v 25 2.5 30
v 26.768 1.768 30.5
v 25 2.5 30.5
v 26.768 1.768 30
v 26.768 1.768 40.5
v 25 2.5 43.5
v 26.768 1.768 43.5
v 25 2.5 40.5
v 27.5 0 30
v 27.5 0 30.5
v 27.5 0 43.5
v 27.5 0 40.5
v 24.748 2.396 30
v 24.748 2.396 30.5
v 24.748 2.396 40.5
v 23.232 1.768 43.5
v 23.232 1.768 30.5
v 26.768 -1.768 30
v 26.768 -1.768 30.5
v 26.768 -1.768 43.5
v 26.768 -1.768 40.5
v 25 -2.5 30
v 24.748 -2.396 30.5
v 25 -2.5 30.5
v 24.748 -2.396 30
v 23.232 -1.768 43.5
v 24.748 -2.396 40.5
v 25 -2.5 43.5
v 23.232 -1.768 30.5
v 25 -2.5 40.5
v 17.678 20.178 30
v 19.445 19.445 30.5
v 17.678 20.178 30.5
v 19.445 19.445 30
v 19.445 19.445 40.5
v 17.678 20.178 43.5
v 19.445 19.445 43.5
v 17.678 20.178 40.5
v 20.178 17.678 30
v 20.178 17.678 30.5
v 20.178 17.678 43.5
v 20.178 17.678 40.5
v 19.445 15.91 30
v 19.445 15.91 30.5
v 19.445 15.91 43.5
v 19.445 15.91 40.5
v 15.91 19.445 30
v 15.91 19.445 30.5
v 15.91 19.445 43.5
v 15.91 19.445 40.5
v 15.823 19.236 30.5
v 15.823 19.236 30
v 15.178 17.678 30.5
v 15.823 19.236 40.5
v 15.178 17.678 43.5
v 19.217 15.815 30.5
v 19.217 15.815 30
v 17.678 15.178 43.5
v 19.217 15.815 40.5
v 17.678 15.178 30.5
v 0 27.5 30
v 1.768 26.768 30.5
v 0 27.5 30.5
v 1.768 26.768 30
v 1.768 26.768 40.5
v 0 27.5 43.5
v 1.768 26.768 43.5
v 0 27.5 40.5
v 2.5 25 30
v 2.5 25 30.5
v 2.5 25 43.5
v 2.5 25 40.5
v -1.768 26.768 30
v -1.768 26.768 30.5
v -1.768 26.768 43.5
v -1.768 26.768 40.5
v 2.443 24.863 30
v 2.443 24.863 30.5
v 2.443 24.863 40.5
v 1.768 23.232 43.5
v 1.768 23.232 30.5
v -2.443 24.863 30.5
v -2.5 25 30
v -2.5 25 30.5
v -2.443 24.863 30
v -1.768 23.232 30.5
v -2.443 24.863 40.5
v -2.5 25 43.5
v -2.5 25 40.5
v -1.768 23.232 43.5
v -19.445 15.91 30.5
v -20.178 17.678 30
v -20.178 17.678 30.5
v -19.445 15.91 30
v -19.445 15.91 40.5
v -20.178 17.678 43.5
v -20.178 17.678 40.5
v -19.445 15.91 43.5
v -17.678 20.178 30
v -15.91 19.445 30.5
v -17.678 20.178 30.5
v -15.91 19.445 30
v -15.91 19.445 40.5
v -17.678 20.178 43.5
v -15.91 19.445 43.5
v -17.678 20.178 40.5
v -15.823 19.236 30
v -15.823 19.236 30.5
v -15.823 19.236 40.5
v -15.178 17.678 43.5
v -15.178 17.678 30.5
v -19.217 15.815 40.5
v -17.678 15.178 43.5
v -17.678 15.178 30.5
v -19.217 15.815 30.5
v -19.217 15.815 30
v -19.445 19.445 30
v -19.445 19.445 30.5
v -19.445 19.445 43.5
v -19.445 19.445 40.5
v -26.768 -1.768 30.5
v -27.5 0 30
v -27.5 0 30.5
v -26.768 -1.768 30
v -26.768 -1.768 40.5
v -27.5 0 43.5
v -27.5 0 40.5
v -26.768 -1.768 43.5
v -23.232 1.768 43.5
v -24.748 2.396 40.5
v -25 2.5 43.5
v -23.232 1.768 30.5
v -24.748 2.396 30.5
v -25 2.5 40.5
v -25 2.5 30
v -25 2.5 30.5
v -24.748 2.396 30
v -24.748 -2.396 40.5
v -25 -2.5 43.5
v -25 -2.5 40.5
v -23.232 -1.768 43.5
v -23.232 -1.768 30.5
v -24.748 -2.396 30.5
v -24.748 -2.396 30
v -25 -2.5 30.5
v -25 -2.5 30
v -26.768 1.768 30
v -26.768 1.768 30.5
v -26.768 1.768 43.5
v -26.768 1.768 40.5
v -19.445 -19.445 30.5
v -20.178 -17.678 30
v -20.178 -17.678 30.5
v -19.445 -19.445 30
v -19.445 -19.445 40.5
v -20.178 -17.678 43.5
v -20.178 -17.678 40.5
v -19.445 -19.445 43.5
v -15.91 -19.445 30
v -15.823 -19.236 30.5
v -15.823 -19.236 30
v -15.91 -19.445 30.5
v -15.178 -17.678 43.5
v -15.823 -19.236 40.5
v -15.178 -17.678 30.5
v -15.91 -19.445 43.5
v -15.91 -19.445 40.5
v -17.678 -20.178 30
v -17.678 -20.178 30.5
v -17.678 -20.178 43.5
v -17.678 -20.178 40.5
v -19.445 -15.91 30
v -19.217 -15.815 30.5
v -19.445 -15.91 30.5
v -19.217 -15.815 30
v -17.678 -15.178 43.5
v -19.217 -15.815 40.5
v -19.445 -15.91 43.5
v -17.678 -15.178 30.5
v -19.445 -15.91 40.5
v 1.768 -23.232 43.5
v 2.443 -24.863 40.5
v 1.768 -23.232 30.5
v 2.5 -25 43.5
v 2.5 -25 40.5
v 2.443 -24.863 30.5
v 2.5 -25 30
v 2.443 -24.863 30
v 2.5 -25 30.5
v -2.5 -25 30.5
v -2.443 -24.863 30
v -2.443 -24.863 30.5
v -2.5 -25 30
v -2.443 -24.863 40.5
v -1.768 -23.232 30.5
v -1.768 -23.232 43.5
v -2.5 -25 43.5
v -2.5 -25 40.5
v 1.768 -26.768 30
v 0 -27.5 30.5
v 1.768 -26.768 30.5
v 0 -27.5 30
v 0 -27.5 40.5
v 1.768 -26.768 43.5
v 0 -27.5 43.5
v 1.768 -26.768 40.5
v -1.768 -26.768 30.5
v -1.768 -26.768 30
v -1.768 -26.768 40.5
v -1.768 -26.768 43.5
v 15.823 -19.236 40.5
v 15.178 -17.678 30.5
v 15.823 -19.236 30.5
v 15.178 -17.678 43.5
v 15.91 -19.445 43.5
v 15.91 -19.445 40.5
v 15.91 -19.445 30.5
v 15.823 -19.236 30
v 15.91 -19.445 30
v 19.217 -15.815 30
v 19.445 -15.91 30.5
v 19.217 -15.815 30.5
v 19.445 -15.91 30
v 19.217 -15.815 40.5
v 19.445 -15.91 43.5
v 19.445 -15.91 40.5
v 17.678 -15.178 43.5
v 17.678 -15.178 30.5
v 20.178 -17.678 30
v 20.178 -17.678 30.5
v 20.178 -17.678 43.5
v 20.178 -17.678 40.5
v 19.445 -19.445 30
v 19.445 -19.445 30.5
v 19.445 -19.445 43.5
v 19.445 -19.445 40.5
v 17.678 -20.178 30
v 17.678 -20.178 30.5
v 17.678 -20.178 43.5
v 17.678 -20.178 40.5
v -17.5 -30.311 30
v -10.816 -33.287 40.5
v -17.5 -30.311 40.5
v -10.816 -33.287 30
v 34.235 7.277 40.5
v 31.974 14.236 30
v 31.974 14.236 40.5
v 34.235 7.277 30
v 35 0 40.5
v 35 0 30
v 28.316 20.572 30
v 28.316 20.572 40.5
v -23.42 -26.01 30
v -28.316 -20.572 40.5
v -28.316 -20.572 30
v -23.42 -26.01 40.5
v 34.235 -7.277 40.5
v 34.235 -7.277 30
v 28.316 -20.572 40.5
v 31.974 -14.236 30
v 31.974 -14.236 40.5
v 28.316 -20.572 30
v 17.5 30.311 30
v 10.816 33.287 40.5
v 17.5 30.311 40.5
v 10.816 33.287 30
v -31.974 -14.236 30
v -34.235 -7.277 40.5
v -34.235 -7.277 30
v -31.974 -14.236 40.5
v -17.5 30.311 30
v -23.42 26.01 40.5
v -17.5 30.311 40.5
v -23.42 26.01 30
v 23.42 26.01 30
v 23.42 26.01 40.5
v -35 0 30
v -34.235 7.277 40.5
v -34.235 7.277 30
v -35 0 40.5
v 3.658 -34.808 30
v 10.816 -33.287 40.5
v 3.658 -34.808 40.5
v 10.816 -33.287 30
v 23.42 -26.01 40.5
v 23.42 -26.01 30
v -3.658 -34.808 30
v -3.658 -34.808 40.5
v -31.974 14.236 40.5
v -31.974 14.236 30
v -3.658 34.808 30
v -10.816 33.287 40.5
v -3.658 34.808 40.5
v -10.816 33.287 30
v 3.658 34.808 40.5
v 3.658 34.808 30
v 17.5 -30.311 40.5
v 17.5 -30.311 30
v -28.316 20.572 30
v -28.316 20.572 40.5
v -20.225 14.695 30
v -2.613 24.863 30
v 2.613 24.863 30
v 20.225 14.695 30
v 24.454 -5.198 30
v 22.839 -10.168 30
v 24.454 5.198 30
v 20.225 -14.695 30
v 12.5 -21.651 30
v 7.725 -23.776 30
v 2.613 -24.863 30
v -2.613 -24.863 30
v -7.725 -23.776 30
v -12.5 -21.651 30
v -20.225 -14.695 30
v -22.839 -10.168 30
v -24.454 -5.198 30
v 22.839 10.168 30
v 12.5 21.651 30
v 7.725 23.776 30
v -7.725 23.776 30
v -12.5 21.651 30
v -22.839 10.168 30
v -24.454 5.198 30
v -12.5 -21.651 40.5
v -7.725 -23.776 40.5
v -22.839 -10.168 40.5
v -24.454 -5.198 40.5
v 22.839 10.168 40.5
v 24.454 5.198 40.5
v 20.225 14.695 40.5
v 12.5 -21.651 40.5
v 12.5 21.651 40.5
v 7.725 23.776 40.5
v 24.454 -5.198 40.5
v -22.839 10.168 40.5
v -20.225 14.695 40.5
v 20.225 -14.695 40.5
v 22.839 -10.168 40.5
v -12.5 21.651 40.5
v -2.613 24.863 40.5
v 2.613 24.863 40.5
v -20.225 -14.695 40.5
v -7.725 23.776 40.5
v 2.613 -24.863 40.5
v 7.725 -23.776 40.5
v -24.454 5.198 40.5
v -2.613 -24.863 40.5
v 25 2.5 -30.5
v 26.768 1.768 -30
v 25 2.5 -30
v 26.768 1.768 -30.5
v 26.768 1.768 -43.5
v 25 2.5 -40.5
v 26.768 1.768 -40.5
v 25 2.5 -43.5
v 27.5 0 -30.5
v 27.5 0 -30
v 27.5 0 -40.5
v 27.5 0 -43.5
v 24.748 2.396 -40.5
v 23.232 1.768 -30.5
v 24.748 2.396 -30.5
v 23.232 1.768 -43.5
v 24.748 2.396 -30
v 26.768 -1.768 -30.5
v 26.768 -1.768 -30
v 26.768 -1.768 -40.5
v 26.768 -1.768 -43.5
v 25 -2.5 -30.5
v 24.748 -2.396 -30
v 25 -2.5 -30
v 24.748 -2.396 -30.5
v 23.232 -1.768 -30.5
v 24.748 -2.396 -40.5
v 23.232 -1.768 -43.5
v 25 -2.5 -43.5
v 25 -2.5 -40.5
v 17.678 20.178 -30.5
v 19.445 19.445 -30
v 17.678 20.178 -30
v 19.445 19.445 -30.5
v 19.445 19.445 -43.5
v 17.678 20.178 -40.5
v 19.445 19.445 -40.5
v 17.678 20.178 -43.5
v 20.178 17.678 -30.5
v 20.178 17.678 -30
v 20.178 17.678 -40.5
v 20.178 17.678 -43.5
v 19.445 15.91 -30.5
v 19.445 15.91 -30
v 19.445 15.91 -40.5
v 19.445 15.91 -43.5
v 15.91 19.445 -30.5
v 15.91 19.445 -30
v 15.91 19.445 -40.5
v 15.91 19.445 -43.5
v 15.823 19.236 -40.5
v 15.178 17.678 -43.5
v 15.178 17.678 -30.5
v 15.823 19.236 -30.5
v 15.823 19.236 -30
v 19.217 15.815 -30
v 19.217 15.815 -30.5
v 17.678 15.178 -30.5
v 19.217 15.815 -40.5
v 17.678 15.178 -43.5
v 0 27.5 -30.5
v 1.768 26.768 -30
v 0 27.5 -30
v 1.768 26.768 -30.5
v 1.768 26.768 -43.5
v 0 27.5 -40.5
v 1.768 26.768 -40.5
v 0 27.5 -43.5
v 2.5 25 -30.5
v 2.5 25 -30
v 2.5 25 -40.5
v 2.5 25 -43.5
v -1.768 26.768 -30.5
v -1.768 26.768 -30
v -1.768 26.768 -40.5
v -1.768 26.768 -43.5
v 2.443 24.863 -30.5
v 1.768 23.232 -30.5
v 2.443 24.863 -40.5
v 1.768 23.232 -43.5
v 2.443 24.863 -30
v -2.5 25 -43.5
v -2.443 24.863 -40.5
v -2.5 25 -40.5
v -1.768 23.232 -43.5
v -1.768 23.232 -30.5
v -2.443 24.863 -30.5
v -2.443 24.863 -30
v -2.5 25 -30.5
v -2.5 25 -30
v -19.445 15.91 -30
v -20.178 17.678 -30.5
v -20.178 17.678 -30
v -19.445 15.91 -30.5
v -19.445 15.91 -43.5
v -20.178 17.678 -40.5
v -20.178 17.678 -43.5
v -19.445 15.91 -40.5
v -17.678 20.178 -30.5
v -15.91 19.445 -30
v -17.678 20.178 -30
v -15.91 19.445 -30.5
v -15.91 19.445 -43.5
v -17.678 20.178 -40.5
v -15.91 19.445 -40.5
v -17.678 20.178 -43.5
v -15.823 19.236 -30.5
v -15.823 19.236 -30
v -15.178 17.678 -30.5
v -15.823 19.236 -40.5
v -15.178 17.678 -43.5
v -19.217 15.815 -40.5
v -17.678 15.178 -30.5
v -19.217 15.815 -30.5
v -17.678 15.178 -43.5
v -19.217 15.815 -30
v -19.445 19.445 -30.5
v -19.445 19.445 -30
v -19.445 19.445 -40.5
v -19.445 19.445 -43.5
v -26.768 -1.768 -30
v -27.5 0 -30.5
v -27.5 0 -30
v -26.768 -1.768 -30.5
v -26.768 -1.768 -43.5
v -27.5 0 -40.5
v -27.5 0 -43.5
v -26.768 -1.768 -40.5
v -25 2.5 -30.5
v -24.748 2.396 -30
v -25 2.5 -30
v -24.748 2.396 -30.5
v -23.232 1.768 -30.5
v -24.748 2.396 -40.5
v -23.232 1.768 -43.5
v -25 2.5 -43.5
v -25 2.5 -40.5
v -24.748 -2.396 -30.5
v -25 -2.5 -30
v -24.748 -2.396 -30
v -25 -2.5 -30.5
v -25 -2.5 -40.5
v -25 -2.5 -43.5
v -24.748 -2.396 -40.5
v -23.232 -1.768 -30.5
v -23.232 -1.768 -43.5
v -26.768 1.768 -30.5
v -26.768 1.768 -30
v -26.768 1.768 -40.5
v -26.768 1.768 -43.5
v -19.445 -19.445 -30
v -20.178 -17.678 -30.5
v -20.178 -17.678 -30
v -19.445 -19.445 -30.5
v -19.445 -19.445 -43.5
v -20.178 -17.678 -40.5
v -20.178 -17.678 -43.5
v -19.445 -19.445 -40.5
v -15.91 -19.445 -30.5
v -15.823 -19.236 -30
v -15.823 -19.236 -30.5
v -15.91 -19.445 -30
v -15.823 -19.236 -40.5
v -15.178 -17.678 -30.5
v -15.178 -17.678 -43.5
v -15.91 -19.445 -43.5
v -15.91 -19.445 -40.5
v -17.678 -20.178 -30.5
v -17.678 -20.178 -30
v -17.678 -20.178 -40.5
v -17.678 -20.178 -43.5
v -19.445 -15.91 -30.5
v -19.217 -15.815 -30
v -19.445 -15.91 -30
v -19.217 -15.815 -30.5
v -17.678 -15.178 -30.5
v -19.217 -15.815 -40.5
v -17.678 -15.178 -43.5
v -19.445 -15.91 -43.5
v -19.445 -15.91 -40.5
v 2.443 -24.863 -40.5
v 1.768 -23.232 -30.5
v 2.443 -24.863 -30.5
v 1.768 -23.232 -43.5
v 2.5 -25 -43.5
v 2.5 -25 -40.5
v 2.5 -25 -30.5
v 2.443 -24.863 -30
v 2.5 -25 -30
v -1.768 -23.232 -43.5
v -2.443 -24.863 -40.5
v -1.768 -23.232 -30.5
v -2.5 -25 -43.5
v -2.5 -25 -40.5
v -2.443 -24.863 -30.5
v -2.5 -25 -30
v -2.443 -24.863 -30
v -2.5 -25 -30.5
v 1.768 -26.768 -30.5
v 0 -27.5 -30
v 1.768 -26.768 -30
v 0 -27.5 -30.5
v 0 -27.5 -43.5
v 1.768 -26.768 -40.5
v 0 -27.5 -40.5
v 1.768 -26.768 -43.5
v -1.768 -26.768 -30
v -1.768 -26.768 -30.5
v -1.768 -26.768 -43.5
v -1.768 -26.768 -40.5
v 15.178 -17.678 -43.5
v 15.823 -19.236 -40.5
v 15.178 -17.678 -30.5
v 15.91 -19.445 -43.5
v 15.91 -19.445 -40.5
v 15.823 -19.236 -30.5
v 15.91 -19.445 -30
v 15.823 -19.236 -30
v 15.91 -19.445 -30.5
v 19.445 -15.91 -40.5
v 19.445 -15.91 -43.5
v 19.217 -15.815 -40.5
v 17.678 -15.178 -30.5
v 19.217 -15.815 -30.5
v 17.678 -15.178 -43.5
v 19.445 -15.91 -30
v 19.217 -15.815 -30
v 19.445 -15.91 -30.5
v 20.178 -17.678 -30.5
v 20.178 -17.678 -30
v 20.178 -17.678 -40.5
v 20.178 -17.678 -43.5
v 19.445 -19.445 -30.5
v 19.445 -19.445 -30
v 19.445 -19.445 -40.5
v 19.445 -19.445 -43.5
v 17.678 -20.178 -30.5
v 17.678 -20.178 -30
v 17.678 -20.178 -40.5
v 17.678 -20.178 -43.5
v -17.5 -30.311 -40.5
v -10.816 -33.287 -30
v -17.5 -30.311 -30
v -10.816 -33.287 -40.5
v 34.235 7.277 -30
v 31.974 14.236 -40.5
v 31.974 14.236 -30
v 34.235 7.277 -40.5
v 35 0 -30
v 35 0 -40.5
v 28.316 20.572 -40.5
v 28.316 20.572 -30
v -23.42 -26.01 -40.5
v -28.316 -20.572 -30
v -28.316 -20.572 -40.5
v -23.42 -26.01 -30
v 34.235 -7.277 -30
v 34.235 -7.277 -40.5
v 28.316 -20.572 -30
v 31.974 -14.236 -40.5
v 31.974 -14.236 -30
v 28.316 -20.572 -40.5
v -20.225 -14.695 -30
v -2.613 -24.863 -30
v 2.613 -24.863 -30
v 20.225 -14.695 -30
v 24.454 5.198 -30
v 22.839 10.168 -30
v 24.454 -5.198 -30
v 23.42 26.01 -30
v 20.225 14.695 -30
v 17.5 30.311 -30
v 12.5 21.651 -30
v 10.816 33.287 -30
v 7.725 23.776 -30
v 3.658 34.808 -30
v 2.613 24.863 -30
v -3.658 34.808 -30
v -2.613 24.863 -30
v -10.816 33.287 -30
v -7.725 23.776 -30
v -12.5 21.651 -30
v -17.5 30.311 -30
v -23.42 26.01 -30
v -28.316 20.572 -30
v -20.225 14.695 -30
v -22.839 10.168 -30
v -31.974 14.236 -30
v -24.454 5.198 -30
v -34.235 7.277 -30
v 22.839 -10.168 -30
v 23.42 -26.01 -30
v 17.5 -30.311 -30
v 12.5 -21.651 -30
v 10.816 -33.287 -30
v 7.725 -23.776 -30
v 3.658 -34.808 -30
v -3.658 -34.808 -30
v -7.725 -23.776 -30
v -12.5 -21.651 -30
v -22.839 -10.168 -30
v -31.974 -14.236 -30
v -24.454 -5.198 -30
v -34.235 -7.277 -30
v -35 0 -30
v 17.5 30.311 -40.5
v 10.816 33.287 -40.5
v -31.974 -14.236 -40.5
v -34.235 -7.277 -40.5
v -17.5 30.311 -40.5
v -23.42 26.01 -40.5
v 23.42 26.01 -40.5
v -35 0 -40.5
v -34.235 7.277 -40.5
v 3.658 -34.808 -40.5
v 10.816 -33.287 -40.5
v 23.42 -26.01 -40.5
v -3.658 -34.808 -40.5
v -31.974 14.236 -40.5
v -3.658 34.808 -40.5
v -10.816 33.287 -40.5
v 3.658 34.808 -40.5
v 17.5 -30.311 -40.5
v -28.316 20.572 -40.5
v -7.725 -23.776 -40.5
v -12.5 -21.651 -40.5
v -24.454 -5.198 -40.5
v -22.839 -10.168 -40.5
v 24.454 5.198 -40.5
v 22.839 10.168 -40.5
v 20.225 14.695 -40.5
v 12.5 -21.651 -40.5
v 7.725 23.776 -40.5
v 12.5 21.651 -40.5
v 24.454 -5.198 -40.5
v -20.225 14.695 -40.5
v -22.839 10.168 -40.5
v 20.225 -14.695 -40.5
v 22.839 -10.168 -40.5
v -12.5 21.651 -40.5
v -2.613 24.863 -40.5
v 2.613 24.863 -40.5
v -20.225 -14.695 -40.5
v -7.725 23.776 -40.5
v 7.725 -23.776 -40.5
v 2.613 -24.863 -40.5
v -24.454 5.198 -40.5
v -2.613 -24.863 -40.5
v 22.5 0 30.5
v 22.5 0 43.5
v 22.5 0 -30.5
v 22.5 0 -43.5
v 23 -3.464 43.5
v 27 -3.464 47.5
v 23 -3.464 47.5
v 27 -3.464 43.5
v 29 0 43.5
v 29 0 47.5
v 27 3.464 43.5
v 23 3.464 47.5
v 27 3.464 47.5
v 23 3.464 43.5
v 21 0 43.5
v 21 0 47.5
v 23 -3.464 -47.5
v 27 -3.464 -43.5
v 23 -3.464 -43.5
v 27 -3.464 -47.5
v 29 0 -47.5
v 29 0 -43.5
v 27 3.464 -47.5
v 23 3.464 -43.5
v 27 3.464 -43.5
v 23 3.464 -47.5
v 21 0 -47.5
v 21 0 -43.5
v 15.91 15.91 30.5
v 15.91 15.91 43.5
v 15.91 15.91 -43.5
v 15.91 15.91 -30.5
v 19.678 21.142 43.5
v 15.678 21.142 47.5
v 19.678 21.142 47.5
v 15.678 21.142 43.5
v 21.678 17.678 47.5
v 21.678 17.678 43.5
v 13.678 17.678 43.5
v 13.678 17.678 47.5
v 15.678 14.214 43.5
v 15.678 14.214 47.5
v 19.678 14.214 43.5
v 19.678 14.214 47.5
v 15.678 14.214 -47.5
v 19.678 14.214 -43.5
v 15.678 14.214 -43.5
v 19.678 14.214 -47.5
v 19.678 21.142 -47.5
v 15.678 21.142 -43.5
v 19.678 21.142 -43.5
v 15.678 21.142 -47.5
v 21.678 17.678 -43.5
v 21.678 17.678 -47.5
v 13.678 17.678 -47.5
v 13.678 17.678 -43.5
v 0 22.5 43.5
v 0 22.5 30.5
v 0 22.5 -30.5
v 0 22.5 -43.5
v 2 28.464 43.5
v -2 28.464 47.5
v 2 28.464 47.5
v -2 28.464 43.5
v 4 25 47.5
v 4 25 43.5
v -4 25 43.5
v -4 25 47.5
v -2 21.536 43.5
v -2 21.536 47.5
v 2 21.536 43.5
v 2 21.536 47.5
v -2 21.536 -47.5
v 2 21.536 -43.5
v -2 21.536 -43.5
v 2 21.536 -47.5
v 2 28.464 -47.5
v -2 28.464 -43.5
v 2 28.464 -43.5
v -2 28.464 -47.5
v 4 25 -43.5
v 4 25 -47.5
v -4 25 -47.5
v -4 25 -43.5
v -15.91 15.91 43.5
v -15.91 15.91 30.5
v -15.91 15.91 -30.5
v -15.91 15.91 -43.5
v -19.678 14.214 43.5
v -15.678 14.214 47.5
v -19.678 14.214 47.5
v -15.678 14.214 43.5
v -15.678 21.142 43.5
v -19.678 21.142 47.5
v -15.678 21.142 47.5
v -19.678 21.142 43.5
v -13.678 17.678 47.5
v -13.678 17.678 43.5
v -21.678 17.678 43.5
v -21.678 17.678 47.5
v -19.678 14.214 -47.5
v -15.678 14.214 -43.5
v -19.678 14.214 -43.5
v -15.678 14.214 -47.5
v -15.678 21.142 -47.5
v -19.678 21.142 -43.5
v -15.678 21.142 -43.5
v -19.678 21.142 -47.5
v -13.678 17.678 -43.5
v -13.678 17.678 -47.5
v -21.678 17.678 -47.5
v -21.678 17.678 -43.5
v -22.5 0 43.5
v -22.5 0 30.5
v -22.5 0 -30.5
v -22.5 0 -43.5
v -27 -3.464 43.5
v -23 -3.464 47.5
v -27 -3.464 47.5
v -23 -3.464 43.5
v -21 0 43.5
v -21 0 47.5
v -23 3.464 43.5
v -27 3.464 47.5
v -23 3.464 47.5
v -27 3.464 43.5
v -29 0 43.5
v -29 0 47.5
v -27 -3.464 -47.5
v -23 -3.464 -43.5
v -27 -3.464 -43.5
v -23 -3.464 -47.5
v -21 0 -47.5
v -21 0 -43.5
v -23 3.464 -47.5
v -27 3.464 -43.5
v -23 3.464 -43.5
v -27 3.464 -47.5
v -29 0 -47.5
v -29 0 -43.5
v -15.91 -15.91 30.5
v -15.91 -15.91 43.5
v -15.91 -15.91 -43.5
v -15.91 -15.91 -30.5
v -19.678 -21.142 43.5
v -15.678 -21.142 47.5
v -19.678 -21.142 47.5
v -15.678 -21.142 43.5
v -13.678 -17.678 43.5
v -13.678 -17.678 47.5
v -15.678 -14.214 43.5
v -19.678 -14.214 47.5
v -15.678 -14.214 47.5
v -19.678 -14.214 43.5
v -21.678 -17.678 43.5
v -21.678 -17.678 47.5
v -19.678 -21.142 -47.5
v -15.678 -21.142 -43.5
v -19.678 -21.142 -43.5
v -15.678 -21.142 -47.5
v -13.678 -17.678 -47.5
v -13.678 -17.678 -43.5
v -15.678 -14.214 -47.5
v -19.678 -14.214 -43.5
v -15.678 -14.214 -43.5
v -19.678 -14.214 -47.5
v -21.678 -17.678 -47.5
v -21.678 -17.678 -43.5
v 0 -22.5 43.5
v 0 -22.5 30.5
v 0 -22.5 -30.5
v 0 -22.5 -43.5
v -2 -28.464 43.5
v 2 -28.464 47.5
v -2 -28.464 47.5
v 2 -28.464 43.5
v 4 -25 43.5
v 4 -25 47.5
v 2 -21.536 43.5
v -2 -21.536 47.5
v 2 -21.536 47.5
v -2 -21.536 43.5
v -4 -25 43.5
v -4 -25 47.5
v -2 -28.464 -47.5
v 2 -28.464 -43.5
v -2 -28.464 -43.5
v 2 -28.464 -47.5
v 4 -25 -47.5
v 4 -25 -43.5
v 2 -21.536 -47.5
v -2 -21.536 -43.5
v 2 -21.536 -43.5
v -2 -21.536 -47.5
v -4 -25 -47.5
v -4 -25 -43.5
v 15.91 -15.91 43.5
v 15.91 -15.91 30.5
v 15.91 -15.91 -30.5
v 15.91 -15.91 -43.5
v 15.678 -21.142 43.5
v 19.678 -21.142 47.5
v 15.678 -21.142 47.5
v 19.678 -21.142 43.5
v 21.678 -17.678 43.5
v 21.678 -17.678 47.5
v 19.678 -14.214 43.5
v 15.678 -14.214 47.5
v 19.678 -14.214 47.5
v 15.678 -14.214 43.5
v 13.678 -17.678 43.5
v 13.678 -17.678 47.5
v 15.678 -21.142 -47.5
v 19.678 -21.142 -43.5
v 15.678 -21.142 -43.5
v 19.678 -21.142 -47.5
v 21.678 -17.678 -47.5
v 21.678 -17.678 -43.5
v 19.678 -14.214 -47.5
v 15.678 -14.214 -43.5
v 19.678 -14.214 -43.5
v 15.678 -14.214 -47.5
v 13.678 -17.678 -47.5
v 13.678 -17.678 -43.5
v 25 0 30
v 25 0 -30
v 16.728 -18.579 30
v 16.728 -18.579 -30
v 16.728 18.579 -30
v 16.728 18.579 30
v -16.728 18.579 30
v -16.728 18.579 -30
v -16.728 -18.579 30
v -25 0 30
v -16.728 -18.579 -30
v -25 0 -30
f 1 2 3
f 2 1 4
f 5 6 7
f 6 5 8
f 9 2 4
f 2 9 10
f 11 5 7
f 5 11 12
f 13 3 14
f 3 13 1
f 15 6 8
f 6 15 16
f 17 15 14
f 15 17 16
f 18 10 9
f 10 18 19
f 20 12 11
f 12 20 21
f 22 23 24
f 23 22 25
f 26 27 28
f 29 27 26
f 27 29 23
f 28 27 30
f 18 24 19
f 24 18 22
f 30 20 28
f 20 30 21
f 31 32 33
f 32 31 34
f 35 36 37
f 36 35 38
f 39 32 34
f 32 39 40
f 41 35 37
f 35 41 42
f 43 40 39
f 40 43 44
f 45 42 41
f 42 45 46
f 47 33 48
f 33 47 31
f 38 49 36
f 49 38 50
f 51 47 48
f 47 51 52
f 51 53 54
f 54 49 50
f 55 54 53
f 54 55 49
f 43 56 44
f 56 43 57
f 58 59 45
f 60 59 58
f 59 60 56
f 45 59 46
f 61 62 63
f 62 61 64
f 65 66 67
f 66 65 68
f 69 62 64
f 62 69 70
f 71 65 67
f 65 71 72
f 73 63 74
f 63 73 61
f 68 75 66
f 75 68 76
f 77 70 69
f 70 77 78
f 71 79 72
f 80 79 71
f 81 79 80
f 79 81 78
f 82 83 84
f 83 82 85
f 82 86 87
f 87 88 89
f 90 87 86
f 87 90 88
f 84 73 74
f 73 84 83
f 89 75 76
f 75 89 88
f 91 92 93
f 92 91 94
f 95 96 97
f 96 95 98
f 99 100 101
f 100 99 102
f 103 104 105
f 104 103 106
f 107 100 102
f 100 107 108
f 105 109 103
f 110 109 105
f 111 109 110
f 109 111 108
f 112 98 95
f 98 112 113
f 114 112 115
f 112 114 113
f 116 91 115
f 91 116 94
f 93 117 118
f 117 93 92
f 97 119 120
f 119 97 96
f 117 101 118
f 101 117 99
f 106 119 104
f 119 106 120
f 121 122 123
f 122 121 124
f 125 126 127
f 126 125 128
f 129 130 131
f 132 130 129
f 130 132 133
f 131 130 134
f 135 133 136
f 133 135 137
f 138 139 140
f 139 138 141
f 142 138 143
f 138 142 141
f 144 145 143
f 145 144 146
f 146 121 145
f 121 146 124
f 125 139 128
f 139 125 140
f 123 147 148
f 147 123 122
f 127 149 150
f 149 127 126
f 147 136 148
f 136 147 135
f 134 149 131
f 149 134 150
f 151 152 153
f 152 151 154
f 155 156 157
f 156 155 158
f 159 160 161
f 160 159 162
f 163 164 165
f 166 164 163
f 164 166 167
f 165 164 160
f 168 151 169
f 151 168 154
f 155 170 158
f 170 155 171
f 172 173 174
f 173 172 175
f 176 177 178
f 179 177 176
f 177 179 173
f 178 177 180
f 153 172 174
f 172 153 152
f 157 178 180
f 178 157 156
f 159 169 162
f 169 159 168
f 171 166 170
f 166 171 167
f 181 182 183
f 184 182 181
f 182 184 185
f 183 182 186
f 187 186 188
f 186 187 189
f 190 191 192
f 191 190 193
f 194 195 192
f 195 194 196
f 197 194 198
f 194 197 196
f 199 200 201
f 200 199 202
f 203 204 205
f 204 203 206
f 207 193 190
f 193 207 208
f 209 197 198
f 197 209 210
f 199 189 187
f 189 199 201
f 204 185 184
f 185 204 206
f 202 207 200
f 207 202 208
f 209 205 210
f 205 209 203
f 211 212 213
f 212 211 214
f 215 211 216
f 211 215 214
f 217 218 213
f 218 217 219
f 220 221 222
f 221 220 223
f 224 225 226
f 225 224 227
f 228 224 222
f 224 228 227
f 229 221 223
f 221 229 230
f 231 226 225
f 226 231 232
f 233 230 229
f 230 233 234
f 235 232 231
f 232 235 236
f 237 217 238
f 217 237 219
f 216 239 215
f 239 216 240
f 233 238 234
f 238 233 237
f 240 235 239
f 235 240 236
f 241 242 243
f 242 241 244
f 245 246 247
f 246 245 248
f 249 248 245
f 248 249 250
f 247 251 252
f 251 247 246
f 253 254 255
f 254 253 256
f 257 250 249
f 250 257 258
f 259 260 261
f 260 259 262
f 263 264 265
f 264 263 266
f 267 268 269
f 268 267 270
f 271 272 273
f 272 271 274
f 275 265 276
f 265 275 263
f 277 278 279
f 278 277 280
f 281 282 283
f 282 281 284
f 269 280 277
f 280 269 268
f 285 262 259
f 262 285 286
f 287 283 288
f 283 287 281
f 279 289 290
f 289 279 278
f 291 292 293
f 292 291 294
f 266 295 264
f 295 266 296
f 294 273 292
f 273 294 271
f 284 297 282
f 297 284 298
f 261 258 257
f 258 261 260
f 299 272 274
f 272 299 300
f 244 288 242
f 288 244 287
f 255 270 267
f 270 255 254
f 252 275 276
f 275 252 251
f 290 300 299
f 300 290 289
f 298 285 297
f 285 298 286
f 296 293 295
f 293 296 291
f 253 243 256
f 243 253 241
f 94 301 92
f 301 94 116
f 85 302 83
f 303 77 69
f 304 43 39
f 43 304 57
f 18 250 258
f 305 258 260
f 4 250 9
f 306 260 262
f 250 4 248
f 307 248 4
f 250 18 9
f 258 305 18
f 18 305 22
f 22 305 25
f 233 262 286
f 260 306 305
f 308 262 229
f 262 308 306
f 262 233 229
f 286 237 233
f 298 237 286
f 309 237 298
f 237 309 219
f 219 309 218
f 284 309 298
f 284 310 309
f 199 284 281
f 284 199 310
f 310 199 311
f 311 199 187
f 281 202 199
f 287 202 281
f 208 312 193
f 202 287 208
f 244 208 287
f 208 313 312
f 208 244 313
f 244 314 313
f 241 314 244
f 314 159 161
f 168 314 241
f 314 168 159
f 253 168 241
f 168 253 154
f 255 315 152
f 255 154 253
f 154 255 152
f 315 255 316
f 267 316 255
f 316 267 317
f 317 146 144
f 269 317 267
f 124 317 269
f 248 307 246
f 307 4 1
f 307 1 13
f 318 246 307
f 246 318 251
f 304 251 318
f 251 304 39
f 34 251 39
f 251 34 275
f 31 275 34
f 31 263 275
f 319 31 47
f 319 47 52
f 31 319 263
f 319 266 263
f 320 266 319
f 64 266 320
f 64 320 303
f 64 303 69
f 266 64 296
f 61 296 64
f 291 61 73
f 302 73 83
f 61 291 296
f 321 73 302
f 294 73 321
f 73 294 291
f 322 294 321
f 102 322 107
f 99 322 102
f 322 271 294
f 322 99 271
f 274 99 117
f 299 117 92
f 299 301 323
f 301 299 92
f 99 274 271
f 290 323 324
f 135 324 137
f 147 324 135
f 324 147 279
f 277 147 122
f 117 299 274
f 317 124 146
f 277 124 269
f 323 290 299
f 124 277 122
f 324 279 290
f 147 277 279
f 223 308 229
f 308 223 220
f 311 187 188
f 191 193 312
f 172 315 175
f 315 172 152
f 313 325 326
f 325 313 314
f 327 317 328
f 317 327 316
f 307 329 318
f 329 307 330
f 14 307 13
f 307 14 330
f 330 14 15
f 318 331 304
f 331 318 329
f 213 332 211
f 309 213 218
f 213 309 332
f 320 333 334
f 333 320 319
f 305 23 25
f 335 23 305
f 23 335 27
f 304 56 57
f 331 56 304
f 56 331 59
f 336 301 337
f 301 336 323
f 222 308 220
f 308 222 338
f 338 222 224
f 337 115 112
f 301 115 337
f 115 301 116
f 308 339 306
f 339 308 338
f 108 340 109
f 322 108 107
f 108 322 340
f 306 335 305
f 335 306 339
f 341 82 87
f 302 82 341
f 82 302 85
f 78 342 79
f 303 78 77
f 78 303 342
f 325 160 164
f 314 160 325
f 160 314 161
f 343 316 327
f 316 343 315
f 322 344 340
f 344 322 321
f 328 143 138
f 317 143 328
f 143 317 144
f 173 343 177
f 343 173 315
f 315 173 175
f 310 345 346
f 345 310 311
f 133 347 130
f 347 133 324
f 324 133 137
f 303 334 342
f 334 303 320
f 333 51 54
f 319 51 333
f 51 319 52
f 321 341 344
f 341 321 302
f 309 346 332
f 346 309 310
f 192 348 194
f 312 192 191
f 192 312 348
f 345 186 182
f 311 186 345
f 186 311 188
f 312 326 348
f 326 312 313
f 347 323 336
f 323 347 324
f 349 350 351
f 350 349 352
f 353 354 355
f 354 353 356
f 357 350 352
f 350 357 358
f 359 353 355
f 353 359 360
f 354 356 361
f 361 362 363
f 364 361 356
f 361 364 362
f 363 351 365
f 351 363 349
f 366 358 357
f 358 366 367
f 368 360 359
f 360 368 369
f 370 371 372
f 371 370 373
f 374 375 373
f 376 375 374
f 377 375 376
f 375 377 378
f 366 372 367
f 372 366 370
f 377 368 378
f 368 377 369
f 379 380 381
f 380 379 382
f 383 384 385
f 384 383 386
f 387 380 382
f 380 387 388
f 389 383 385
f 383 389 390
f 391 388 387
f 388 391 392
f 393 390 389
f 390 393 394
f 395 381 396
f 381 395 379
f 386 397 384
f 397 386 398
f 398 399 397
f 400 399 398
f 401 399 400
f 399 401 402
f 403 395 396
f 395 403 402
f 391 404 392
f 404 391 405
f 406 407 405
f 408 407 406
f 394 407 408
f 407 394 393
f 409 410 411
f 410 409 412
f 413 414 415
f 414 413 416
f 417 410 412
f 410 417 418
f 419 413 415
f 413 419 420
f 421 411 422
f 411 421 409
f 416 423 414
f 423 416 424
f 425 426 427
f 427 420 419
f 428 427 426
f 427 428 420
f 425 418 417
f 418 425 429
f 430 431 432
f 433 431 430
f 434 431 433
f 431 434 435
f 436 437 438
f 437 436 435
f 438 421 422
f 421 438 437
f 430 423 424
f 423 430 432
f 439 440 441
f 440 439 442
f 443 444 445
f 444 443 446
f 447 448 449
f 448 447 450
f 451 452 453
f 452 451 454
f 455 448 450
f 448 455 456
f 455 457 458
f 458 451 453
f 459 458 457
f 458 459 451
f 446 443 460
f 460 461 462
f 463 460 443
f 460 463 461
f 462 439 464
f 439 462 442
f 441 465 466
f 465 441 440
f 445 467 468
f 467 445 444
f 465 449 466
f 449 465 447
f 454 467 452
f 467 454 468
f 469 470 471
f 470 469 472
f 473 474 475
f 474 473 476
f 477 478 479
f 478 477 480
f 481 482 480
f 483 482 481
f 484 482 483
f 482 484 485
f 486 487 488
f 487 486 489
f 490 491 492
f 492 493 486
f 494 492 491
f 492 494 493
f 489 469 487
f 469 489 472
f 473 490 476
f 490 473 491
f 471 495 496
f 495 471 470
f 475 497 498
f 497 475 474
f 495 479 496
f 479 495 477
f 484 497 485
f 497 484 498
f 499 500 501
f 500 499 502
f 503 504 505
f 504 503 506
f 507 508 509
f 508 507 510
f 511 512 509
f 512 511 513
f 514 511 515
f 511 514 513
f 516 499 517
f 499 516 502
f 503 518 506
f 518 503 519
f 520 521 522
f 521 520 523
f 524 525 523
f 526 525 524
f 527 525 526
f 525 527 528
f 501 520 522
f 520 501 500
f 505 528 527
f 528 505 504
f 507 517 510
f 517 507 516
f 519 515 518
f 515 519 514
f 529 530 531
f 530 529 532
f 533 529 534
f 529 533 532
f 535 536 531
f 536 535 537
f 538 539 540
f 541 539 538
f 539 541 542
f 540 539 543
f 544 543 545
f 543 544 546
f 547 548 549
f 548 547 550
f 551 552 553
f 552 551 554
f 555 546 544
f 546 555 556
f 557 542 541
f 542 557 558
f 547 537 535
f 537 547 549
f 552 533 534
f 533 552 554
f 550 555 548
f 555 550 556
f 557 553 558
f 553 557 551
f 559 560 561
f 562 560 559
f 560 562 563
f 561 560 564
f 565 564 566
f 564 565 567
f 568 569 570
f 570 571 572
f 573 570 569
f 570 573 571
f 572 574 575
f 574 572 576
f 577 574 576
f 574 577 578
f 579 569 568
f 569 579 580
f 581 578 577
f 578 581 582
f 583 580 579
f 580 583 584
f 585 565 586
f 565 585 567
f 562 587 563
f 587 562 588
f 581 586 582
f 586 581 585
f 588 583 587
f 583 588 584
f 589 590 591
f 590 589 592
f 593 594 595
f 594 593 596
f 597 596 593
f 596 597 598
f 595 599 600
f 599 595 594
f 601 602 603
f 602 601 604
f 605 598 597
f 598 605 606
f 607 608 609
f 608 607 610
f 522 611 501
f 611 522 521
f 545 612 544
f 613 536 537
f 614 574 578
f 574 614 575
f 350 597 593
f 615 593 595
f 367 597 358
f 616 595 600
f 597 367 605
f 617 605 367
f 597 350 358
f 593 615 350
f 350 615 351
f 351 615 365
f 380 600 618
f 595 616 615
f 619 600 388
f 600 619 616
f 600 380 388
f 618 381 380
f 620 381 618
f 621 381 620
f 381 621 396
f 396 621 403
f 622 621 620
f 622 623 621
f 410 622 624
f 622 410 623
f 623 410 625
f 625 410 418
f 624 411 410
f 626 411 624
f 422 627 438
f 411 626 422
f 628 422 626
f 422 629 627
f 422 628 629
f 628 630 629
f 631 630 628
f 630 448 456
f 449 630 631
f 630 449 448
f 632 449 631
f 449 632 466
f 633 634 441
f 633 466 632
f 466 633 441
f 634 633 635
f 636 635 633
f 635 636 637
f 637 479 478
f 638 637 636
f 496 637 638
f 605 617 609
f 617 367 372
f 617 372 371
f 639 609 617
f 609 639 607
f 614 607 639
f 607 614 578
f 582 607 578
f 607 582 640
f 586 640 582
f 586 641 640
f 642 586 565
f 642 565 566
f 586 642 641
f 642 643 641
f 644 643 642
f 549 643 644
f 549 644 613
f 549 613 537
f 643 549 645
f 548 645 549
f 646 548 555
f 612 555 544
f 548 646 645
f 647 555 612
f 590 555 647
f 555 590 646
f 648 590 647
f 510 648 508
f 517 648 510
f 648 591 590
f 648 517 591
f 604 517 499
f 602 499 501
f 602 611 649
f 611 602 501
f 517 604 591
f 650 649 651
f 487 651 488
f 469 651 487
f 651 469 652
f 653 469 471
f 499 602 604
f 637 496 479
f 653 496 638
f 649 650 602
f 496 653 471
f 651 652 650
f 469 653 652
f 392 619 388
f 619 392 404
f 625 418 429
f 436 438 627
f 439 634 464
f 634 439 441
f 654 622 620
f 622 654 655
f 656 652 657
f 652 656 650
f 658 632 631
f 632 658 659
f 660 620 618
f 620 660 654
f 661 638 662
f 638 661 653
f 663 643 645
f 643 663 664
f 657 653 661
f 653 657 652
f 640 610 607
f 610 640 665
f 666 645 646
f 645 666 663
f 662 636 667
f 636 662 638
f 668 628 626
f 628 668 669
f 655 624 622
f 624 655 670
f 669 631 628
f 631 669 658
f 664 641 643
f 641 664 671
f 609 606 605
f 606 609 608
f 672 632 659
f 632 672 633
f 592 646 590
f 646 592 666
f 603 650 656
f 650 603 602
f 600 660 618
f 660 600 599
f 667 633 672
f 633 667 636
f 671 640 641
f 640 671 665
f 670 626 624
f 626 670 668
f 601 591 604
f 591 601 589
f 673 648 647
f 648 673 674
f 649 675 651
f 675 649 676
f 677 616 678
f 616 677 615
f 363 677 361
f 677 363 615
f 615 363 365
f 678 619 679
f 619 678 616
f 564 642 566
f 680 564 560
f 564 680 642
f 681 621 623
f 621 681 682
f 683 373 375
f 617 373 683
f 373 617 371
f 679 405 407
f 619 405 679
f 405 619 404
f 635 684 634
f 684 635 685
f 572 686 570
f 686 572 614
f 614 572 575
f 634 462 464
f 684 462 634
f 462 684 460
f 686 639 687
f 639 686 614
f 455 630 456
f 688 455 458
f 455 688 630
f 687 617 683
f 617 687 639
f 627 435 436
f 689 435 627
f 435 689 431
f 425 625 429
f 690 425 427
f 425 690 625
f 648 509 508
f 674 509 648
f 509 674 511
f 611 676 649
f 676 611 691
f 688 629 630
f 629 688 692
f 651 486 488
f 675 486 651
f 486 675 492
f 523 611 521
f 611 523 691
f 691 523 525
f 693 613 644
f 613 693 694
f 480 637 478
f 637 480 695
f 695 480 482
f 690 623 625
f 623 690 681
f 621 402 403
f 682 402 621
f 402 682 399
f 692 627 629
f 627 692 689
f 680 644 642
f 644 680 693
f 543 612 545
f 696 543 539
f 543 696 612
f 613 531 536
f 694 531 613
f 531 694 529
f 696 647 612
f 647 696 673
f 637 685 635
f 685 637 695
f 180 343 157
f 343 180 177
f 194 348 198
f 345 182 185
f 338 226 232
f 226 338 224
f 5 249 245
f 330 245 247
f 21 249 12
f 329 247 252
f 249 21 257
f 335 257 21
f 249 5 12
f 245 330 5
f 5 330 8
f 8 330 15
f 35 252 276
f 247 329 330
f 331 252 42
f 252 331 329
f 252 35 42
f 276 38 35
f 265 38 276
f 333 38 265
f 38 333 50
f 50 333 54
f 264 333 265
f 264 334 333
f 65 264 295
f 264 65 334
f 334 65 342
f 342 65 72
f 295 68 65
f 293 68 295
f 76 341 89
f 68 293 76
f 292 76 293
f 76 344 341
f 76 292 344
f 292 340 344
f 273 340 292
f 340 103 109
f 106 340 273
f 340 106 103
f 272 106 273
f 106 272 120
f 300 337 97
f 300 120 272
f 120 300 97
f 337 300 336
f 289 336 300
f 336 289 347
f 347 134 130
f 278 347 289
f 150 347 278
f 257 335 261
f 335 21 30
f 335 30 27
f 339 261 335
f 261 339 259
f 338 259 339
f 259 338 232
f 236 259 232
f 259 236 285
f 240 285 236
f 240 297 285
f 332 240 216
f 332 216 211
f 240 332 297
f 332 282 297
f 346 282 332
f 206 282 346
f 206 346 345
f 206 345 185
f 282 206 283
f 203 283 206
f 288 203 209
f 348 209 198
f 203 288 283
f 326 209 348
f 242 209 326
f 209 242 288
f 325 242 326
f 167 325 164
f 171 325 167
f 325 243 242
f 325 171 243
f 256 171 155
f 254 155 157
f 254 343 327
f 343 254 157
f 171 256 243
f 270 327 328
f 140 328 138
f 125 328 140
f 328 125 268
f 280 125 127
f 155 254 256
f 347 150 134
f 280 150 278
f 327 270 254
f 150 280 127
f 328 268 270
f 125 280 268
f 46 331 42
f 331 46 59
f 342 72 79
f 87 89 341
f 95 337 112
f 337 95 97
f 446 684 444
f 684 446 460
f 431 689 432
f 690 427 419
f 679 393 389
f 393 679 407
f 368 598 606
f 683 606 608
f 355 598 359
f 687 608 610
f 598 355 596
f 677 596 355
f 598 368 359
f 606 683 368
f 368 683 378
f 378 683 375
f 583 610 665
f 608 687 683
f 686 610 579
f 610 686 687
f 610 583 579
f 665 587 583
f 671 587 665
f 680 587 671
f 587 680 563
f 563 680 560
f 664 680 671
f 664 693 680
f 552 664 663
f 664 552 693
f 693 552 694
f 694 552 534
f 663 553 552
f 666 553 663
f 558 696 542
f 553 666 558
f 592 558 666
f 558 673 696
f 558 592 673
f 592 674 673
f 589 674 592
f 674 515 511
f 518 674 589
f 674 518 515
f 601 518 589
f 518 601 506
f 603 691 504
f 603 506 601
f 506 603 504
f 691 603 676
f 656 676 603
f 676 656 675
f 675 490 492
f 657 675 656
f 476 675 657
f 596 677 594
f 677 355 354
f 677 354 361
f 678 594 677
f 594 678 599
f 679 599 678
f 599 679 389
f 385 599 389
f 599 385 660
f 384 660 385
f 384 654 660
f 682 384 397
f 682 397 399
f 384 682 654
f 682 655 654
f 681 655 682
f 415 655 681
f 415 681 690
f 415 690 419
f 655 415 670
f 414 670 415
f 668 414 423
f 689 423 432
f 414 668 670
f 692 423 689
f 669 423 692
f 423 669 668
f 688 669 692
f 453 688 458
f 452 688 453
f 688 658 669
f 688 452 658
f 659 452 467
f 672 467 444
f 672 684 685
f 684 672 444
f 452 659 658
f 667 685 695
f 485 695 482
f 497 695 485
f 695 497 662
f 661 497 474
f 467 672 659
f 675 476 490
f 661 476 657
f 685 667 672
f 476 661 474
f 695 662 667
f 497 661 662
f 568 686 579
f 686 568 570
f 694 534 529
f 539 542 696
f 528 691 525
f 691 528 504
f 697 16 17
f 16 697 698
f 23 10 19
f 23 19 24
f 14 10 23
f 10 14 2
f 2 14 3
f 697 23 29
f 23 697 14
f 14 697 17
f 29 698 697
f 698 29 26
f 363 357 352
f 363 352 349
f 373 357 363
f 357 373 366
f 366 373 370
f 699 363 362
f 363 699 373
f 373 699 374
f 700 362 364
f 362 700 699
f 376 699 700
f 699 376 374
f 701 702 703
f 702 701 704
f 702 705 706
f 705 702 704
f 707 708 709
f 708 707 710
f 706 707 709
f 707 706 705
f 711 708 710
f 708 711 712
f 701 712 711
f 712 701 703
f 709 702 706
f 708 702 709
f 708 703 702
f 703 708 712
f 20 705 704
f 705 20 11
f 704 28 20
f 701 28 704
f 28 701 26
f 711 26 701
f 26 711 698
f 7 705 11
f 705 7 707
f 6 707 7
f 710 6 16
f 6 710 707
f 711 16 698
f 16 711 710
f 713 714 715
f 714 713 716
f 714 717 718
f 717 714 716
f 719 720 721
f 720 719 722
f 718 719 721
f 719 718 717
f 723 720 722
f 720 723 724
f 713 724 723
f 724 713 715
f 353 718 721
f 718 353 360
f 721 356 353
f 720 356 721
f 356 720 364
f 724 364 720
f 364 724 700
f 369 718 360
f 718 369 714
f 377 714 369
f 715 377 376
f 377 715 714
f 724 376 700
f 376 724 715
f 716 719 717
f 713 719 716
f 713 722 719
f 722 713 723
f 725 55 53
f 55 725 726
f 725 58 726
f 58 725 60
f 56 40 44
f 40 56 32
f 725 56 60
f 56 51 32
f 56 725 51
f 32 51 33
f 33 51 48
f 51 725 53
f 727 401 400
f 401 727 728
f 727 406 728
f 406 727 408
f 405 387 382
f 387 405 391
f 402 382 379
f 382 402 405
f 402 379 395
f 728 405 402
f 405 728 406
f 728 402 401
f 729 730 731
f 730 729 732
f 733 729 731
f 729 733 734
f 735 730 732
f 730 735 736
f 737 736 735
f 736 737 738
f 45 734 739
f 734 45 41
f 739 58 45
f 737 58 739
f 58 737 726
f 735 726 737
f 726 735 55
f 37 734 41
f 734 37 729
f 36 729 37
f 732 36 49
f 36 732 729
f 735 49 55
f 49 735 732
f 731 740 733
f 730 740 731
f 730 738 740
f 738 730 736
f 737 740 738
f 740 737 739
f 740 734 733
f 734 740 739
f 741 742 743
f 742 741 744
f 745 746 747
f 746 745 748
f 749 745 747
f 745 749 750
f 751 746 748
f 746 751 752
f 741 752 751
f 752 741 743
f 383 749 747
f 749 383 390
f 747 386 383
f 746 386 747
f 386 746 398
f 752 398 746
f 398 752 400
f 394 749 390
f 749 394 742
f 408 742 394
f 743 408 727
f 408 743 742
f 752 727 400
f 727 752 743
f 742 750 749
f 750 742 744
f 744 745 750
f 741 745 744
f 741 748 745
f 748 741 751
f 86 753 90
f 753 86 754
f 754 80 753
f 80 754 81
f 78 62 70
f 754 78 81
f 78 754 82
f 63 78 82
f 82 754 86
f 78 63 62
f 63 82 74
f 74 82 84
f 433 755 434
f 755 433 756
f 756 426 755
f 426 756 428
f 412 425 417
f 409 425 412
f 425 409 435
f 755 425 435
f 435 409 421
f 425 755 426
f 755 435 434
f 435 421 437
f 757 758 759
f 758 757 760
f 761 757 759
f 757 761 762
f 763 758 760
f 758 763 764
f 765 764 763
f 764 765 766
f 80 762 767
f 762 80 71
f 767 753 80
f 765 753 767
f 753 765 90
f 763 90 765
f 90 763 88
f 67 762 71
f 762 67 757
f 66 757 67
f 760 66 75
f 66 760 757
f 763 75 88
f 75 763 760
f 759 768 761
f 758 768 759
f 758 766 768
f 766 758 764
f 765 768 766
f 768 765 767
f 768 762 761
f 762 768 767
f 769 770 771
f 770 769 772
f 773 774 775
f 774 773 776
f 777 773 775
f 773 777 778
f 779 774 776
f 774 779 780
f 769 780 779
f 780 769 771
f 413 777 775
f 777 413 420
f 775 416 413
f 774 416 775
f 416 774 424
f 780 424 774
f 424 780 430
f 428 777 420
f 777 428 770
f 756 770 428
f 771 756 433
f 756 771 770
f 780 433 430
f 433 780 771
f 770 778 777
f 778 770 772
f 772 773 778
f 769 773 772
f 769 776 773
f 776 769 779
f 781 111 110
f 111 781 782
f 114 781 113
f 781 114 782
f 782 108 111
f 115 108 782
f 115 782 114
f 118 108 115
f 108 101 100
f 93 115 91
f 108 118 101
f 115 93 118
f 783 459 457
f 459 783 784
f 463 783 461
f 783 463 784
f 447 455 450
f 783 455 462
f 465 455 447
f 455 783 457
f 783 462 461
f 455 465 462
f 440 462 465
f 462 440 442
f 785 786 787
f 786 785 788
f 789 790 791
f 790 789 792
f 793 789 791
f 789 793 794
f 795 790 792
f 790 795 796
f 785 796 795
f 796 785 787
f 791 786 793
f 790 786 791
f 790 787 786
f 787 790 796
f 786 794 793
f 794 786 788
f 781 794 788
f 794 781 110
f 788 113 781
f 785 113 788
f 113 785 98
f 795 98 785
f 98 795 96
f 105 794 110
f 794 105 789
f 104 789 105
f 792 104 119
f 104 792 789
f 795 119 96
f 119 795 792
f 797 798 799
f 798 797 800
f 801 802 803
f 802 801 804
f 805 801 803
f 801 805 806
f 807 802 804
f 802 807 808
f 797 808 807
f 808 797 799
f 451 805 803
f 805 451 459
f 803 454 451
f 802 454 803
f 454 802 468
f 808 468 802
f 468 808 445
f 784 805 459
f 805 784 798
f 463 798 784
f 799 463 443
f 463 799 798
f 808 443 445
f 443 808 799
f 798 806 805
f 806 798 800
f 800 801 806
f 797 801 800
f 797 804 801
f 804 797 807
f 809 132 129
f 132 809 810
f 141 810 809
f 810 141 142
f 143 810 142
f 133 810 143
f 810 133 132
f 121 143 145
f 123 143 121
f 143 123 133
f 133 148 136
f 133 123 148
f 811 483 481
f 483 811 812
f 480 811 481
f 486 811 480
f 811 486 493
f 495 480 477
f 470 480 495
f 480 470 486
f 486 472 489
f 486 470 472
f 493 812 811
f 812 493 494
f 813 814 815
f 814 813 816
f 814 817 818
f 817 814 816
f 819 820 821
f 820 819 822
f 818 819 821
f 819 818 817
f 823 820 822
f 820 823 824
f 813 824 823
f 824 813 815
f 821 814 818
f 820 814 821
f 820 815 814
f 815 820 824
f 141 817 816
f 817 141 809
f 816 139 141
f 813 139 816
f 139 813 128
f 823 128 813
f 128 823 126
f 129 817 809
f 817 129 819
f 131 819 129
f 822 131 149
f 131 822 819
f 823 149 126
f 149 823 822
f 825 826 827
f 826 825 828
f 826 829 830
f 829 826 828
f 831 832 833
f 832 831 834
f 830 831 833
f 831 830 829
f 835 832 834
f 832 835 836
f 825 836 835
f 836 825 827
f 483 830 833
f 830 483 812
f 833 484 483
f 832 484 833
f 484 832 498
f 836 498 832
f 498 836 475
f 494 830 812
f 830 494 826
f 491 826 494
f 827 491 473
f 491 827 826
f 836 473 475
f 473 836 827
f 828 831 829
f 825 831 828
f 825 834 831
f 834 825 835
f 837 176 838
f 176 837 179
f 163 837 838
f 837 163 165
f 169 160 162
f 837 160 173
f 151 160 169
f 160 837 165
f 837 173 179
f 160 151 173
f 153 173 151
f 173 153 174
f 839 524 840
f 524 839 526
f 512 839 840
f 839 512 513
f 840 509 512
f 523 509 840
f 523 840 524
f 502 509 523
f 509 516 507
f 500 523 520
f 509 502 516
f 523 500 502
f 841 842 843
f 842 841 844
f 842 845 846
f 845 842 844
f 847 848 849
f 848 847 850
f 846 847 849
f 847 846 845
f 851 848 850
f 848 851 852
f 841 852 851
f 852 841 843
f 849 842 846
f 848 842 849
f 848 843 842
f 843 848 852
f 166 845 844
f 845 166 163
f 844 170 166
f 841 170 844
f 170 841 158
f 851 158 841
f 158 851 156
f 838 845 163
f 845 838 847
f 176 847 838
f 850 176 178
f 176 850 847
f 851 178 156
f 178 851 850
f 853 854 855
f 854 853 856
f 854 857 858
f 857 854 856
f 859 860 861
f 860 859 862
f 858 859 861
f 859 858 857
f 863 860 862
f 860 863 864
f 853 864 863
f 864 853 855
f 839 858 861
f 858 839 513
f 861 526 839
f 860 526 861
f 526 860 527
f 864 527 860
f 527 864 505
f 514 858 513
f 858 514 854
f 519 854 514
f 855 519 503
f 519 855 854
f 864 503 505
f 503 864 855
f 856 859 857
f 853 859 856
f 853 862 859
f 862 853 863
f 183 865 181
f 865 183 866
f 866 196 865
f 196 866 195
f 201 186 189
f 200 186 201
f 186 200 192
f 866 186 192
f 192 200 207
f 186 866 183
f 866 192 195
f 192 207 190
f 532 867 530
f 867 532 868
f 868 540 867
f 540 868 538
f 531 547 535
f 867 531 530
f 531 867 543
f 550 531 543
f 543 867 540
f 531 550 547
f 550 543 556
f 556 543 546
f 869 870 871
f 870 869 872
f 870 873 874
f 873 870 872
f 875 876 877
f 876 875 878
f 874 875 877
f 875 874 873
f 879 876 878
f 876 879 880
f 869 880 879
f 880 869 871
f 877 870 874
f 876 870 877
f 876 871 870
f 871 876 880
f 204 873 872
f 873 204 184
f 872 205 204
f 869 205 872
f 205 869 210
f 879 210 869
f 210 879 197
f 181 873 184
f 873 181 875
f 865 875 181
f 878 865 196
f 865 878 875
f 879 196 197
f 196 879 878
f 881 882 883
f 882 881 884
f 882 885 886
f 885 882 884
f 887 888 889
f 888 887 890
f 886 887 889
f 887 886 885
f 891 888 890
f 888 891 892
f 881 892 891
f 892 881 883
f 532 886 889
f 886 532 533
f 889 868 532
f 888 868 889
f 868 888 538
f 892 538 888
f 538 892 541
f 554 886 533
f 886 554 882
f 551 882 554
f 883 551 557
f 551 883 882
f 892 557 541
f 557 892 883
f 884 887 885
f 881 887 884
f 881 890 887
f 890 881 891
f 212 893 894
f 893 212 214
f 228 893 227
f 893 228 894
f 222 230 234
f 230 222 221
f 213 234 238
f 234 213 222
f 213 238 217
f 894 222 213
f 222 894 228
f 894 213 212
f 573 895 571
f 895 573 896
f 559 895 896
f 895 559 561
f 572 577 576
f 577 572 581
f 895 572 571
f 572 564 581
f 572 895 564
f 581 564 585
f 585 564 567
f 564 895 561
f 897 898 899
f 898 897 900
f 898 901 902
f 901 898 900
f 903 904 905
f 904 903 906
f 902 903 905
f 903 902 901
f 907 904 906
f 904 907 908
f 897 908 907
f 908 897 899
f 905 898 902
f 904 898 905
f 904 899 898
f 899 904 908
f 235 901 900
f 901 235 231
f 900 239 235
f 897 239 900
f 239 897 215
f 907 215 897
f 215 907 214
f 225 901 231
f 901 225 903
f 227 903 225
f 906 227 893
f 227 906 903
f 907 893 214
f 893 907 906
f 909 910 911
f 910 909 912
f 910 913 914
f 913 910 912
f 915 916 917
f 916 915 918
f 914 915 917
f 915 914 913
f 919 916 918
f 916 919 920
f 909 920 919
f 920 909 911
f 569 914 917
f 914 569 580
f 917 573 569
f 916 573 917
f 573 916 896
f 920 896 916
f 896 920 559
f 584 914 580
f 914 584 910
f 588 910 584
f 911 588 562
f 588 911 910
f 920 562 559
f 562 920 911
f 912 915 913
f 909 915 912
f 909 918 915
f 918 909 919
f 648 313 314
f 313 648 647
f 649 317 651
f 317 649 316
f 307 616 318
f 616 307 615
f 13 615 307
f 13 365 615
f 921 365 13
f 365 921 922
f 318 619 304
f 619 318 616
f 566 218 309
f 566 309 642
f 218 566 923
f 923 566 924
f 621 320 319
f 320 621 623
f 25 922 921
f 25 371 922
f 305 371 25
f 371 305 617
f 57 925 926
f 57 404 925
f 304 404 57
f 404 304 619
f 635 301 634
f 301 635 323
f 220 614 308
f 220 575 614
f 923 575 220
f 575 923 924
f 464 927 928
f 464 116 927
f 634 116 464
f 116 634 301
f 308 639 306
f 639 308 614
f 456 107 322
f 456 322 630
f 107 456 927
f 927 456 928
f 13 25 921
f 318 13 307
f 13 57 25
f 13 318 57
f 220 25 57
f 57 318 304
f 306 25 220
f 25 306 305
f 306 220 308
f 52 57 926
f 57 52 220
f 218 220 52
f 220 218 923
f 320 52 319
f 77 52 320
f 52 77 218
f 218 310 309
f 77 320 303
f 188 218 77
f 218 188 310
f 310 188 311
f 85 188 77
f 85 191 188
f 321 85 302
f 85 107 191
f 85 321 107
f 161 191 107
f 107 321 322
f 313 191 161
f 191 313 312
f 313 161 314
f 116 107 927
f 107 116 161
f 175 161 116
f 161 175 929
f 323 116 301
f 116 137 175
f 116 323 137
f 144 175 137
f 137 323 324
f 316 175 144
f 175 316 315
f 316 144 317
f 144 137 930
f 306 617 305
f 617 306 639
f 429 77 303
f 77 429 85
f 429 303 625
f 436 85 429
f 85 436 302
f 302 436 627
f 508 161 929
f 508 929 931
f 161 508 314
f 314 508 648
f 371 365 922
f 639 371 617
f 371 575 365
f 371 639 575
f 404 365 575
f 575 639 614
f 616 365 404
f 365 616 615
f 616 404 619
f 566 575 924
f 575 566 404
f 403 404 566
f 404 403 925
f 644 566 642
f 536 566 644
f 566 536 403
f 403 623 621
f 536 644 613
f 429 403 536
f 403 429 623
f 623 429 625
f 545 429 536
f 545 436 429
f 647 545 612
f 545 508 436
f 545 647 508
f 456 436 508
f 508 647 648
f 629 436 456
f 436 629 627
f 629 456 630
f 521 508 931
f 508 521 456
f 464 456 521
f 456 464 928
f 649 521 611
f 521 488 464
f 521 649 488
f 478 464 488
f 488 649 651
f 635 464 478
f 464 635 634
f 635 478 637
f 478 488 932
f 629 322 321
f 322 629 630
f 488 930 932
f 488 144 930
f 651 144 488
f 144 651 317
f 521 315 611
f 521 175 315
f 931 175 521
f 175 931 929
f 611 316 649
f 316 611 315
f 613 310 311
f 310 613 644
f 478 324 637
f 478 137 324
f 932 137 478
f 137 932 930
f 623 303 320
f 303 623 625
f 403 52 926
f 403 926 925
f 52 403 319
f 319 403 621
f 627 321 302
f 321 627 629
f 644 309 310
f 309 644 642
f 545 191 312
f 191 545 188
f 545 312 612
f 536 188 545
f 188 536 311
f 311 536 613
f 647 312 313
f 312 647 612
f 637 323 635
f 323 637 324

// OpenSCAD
// Parameters
central_body_diameter = 50;
central_body_length = 60;
flange_diameter = 70;
flange_thickness = 5;
spacer_ring_thickness = 3;
bolt_diameter = 5;
bolt_length = 15;
nut_diameter = 8;
nut_thickness = 4;
bolt_spacing_radius = 25;
num_bolts = 8;

// Central Body
module central_body() {
    cylinder(d=central_body_diameter, h=central_body_length, center=true);
}

// Flange Plate
module flange_plate() {
    difference() {
        cylinder(d=flange_diameter, h=flange_thickness, center=true);
        cylinder(d=central_body_diameter, h=flange_thickness + 2, center=true);
        for (i = [0:num_bolts-1]) {
            angle = i * 360 / num_bolts;
            translate([bolt_spacing_radius * cos(angle), bolt_spacing_radius * sin(angle), 0])
                cylinder(d=bolt_diameter, h=flange_thickness + 2, center=true);
        }
    }
}

// Spacer Ring
module spacer_ring() {
    difference() {
        cylinder(d=flange_diameter, h=spacer_ring_thickness, center=true);
        cylinder(d=central_body_diameter, h=spacer_ring_thickness + 2, center=true);
    }
}

// Bolt
module bolt() {
    cylinder(d=bolt_diameter, h=bolt_length, center=true);
}

// Nut
module nut() {
    cylinder(d=nut_diameter, h=nut_thickness, center=true, $fn=6);
}

// Assembly
module coupling() {
    // Central Body
    translate([0, 0, 0])
        central_body();
    
    // Flange Plates
    translate([0, 0, central_body_length/2 + flange_thickness/2])
        flange_plate();
    translate([0, 0, -central_body_length/2 - flange_thickness/2])
        flange_plate();
    
    // External Flange Plates
    translate([0, 0, central_body_length/2 + flange_thickness + spacer_ring_thickness])
        flange_plate();
    translate([0, 0, -central_body_length/2 - flange_thickness - spacer_ring_thickness])
        flange_plate();
    
    // Spacer Rings
    translate([0, 0, central_body_length/2 + flange_thickness + spacer_ring_thickness/2])
        spacer_ring();
    translate([0, 0, -central_body_length/2 - flange_thickness - spacer_ring_thickness/2])
        spacer_ring();
    
    // Bolts and Nuts
    for (i = [0:num_bolts-1]) {
        angle = i * 360 / num_bolts;
        translate([bolt_spacing_radius * cos(angle), bolt_spacing_radius * sin(angle), central_body_length/2 + flange_thickness + spacer_ring_thickness])
            bolt();
        translate([bolt_spacing_radius * cos(angle), bolt_spacing_radius * sin(angle), -central_body_length/2 - flange_thickness - spacer_ring_thickness])
            bolt();
        
        translate([bolt_spacing_radius * cos(angle), bolt_spacing_radius * sin(angle), central_body_length/2 + flange_thickness + spacer_ring_thickness + bolt_length/2])
            nut();
        translate([bolt_spacing_radius * cos(angle), bolt_spacing_radius * sin(angle), -central_body_length/2 - flange_thickness - spacer_ring_thickness - bolt_length/2])
            nut();
    }
}

// Render the coupling
coupling();
